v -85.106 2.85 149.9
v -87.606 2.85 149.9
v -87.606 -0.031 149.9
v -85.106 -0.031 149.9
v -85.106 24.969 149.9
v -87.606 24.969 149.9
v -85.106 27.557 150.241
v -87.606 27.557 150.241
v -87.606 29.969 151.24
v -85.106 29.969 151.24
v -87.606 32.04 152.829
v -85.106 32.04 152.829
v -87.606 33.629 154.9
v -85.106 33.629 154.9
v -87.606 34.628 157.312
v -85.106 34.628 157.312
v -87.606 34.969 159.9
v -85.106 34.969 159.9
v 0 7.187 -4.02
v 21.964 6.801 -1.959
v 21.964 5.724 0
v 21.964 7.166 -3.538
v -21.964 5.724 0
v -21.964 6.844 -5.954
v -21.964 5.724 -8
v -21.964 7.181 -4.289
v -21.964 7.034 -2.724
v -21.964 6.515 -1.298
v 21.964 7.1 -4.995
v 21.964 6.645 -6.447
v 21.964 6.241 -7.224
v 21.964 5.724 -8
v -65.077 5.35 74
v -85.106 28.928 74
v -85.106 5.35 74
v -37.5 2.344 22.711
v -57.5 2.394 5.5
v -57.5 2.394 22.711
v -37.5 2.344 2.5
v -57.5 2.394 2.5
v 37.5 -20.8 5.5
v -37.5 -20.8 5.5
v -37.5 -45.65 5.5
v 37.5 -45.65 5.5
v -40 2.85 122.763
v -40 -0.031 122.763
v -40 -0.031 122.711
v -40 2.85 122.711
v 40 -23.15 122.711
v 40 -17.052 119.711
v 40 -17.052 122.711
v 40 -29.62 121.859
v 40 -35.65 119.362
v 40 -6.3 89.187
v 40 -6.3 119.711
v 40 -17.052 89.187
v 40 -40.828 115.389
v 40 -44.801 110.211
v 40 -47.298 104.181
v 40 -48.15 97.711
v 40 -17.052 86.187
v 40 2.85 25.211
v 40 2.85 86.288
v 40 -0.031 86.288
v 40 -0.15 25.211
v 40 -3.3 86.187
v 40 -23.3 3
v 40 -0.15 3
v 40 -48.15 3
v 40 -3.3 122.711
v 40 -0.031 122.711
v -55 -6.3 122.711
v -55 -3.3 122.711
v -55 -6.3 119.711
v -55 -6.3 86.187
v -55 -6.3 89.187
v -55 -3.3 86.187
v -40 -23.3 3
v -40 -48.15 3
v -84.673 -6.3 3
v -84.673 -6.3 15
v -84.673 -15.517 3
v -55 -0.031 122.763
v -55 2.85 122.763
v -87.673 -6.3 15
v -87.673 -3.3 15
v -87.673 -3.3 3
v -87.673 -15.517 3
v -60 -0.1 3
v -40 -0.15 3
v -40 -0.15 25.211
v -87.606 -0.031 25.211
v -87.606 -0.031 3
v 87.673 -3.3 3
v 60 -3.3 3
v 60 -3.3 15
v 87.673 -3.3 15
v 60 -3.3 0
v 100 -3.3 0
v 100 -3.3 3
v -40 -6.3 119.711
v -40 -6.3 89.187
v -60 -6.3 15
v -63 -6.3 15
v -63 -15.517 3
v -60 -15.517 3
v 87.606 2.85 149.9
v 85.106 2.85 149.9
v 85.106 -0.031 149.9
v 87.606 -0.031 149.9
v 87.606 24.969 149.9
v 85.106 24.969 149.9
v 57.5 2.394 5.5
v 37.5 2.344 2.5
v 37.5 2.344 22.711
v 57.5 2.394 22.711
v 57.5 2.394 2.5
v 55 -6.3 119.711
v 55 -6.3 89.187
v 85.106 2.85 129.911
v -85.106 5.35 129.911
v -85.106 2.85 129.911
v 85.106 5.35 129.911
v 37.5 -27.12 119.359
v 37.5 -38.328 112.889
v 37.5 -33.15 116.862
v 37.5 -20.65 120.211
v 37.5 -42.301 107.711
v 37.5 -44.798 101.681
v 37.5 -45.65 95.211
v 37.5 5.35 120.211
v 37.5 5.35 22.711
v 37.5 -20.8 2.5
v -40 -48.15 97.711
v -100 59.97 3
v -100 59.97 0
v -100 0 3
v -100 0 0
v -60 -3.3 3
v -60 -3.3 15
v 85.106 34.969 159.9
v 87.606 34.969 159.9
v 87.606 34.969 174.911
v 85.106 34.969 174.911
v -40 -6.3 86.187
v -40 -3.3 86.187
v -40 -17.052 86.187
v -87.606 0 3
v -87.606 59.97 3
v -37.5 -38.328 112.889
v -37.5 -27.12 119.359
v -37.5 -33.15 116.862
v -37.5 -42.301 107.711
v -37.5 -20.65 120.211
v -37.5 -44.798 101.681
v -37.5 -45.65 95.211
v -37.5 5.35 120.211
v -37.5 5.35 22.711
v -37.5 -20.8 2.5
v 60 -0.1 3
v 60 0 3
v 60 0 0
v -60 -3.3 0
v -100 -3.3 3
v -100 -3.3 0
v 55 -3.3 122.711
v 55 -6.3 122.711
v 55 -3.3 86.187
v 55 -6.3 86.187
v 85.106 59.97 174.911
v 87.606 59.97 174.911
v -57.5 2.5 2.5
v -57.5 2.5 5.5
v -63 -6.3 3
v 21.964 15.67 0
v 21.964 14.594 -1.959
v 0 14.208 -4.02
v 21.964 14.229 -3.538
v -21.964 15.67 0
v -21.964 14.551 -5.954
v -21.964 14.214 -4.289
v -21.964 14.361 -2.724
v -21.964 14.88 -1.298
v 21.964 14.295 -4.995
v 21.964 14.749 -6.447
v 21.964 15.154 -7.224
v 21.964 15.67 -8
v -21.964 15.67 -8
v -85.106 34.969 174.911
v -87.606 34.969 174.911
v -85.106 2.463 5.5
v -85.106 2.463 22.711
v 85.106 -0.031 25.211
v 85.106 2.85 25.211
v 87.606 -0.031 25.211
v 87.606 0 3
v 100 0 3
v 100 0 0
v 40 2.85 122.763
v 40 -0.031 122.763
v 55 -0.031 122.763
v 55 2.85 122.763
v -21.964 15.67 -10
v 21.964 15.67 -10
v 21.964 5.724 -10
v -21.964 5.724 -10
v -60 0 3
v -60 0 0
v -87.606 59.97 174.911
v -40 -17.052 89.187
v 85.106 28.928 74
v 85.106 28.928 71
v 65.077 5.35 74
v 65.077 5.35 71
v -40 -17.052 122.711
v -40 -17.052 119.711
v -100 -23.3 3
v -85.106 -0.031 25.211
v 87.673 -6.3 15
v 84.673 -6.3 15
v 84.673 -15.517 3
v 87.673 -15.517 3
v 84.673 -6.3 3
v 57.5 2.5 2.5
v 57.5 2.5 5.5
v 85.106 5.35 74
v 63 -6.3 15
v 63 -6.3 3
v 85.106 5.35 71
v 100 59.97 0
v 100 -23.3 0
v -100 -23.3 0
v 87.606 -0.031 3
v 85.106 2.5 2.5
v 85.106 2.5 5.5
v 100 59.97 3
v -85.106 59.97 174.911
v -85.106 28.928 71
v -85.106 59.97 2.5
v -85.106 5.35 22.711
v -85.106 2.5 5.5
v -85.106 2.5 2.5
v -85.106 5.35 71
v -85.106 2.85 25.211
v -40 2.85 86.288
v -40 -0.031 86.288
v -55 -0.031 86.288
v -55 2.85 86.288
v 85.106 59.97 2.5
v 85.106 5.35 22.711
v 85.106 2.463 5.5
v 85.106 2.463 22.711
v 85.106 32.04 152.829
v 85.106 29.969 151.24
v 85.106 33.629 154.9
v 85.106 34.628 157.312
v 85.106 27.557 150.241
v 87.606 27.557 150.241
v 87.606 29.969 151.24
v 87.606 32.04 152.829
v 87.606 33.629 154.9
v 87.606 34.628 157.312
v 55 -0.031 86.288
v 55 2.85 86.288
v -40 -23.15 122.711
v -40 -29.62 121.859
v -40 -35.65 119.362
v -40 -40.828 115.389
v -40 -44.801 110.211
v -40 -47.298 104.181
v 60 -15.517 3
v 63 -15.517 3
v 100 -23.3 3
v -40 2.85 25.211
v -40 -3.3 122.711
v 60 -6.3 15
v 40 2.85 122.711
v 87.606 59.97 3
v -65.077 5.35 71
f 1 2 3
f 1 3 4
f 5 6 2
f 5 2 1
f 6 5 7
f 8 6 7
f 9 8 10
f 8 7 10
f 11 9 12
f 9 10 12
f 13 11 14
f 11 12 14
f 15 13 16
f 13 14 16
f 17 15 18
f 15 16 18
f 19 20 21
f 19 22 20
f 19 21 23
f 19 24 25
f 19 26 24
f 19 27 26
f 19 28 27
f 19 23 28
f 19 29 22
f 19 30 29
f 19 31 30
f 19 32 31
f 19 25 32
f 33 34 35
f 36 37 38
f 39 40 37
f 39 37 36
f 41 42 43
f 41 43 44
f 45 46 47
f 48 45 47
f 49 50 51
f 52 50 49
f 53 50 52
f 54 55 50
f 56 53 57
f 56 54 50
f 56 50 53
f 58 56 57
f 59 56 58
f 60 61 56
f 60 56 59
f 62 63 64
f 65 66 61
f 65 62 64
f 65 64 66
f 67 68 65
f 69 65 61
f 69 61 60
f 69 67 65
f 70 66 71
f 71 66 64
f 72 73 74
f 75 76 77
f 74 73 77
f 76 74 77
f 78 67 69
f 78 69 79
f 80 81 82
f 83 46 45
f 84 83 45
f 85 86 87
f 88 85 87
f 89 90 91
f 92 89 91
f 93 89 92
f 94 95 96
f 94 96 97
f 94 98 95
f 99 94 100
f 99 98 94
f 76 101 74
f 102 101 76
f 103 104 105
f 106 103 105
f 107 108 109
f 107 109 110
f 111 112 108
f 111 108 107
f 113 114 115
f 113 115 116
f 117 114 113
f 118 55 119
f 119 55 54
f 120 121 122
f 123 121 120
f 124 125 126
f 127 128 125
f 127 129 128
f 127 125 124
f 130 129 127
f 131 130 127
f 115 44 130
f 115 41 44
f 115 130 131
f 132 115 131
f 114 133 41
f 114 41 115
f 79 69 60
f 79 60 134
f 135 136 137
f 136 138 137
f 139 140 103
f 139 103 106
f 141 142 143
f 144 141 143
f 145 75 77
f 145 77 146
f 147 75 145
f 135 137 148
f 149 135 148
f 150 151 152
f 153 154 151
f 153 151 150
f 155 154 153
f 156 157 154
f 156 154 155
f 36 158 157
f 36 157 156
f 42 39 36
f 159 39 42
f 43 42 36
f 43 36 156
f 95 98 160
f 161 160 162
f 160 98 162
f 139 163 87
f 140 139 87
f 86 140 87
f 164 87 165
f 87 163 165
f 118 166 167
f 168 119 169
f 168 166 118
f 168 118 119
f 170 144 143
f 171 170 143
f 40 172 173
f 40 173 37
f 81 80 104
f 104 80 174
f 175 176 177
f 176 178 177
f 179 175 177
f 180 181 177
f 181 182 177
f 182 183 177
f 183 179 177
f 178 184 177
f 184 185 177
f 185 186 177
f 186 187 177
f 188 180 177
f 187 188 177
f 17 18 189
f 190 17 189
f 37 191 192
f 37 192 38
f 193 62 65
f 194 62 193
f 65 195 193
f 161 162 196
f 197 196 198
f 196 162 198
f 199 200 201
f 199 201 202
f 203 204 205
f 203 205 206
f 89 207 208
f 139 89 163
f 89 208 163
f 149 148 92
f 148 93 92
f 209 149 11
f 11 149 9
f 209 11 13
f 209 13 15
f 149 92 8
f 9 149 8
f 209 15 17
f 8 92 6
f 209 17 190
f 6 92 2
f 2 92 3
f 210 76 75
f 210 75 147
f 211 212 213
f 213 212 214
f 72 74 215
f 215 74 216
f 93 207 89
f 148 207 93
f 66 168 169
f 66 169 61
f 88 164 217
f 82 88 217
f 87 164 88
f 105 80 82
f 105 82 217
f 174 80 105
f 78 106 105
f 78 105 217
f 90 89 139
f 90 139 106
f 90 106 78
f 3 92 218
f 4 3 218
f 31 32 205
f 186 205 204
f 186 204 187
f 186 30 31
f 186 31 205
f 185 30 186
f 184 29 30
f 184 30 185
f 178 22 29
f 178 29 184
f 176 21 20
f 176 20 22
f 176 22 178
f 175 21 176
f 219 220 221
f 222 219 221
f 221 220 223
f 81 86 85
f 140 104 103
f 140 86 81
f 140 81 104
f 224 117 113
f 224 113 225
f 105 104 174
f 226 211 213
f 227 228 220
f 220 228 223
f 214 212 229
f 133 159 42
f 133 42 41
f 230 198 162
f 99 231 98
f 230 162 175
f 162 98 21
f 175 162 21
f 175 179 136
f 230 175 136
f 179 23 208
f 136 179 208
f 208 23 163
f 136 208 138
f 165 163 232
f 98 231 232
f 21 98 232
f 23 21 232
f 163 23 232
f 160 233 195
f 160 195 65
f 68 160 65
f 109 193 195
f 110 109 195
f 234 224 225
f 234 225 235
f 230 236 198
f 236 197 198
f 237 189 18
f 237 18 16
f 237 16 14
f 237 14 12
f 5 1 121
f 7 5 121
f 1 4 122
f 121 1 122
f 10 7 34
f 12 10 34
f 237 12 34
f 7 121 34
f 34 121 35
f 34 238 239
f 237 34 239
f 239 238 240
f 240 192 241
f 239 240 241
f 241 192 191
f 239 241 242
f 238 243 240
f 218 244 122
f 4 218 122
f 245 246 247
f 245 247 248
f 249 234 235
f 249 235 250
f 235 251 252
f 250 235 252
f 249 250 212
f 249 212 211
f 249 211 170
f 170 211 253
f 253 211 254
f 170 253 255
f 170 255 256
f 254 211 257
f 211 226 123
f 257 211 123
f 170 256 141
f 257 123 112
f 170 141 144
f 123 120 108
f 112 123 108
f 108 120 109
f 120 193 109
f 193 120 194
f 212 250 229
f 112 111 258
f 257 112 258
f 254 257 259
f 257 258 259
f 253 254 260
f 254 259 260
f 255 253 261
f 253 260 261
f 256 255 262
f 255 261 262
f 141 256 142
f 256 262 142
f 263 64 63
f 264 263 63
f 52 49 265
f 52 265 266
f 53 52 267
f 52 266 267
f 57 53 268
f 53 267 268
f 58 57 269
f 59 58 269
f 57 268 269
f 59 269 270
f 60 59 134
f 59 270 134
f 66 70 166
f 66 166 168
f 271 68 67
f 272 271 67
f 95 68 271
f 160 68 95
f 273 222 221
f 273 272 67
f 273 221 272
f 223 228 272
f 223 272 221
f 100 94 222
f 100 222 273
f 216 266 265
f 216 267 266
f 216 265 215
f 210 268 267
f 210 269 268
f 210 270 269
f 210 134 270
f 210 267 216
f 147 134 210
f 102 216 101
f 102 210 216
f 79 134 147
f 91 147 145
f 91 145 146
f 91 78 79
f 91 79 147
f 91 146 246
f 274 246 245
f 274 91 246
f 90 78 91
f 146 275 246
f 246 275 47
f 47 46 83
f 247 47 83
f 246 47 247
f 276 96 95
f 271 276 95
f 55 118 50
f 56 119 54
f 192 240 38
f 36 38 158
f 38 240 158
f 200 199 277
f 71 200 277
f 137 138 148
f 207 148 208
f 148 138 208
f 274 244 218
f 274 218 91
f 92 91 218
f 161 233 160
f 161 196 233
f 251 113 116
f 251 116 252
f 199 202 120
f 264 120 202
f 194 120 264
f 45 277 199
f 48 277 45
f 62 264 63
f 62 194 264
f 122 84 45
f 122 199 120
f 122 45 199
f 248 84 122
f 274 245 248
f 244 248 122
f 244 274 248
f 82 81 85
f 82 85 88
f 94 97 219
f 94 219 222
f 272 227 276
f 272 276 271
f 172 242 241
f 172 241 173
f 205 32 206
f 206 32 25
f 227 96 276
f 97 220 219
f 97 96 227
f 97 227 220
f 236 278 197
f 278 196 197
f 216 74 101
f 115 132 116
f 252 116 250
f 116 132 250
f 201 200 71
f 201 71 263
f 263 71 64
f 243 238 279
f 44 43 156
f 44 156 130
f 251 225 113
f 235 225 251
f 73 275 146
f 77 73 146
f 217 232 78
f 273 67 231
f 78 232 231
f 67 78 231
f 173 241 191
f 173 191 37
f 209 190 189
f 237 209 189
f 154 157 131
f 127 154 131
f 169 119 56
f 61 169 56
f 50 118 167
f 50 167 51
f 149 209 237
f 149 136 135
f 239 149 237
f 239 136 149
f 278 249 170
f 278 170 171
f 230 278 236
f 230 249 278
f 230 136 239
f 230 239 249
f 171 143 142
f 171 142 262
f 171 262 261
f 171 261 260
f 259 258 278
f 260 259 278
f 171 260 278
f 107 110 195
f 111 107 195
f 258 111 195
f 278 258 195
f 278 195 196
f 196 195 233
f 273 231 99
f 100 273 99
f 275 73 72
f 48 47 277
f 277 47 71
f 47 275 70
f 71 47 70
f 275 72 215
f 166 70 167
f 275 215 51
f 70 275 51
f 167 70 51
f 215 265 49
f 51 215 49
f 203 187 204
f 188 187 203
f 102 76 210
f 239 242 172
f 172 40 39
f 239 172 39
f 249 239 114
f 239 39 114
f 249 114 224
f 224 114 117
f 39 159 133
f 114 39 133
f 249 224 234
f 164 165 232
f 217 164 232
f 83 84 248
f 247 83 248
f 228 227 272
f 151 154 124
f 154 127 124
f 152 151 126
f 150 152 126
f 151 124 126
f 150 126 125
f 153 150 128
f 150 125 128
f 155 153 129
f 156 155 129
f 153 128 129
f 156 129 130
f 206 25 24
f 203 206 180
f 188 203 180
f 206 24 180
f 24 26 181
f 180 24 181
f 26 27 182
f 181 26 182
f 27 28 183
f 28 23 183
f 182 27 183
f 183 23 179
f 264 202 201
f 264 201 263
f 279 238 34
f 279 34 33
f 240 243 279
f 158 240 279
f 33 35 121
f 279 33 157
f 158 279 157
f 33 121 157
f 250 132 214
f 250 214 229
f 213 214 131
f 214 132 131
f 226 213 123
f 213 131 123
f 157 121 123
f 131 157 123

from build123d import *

# Parameters (mm, degrees)
EXTRUDE_1_DEPTH          = 3
EXTRUDE_2_DEPTH          = 121.210911
SKETCH_3_W               = 47.605950515
SKETCH_3_H               = 3
CUT_EXTRUDE_1_DEPTH      = 99
SKETCH_5_W               = 185.441878516
SKETCH_5_H               = 108.742952173
CUT_EXTRUDE_2_DEPTH      = 1.5
SKETCH_6_W               = 175.21190103
SKETCH_6_H               = 36.65
EXTRUDE_3_DEPTH          = 7.2
SHELL_START              = 5.5
SHELL_1_DEPTH            = 114.710911355
SHELL_START_2            = 2.5
SHELL_1_2_OUTLINE_W      = 170.21190103
SHELL_1_2_OUTLINE_H      = 34.15
SHELL_1_2_DEPTH          = 124.910911355
SHELL_1_3_DEPTH          = 20.210911355
SHELL_1_4_DEPTH          = 17.210911355
SKETCH_7_W               = 170.21190103
SKETCH_7_H               = 34.15
CUT_EXTRUDE_3_DEPTH      = 7.2
SKETCH_8_W               = 2.5
SKETCH_8_H               = 36.65
EXTRUDE_4_DEPTH          = 45
CUT_EXTRUDE_4_DEPTH      = 261.975558395
SKETCH_10_W              = 2.5
SKETCH_10_H              = 2.880985124
EXTRUDE_5_DEPTH          = 124.689092
SKETCH_11_W              = 36.523943303
SKETCH_11_H              = 3
EXTRUDE_6_DEPTH          = 15
SKETCH_12_W              = 36.475357481
SKETCH_12_H              = 3.054288943
EXTRUDE_7_DEPTH          = 15
FILLET_1_R               = 25
SKETCH_13_W              = 43.927566906
SKETCH_13_H              = 9.945864205
EXTRUDE_8_DEPTH          = 8
CUT_EXTRUDE_5_DEPTH      = 219.603325421
SKETCH_15_W              = 43.927566906
SKETCH_15_H              = 9.945864205
EXTRUDE_9_DEPTH          = 2
SKETCH_17_W              = 27.673413216
SKETCH_17_H              = 3
EXTRUDE_10_DEPTH         = 12
RIB_1_REACH              = 263.024
SKETCH_18_WALL_W         = 539.179228978
SKETCH_18_WALL_H         = 3
MIRROR_5_COPY_1_REACH    = 263.024
MIRROR_5_COPY_1_SKETCH_W = 539.179228978
MIRROR_5_COPY_1_SKETCH_H = 3
RIB_2_REACH              = 175.005
SKETCH_19_WALL_W         = 366.464948776
SKETCH_19_WALL_H         = 3
MIRROR_7_COPY_1_REACH    = 175.005
MIRROR_7_COPY_1_SKETCH_W = 366.464948776
MIRROR_7_COPY_1_SKETCH_H = 3
RIB_3_REACH              = 153.018
SKETCH_20_WALL_W         = 334.972416452
SKETCH_20_WALL_H         = 3
EXTRUDE_11_DEPTH         = 20.47
CUT_EXTRUDE_6_DEPTH      = 264.412642976


# Read off the part's stored shape, not the designer's step: 抽壳1
with BuildPart() as part:
    # 草图1 → 凸台-拉伸1 (new body)
    with BuildSketch(Plane.XY):
        Polygon((-100, 0), (-60, 0), (-60, -3.3), (-100, -3.3), (-100, -23.3), (100, -23.3), (100, -3.3), (60, -3.3), (60, 0), (100, 0), (100, 39.5), (-100, 39.5), align=None)
    extrude(amount=EXTRUDE_1_DEPTH)

    # 草图2 → 凸台-拉伸2 (add)
    with BuildSketch(Plane.XY.offset(3)):
        Polygon((40, -48.15), (-40, -48.15), (-40, -0.15), (-87.605950515, -0.030985124), (-87.605950515, 39.5), (87.605950515, 39.5), (87.605950515, -0.030985124), (40, -0.15), align=None)
    extrude(amount=EXTRUDE_2_DEPTH)

    # 草图3 → 切除-拉伸1 (cut)
    with BuildSketch(Plane.XY.offset(124.210911355)):
        with Locations((63.802975258, 1.35)):
            Rectangle(SKETCH_3_W, SKETCH_3_H)
        with Locations((-63.802975258, 1.35)):
            Rectangle(SKETCH_3_W, SKETCH_3_H)
    extrude(amount=-CUT_EXTRUDE_1_DEPTH, mode=Mode.SUBTRACT)

    # 草图5 → 切除-拉伸2 (cut)
    with BuildSketch(Plane.XY.offset(124.210911355)):
        with Locations((-1.343781728, 1.77370169)):
            Rectangle(SKETCH_5_W, SKETCH_5_H)
    extrude(amount=-CUT_EXTRUDE_2_DEPTH, mode=Mode.SUBTRACT)

    # 草图6 → 凸台-拉伸3 (add)
    with BuildSketch(Plane.XY.offset(122.710911355)):
        with Locations((0, 21.175)):
            Rectangle(SKETCH_6_W, SKETCH_6_H)
    extrude(amount=EXTRUDE_3_DEPTH)

    # 抽壳1 outline → 抽壳1 (cut)
    with BuildSketch(Plane.XY.offset(SHELL_START)):
        Polygon((-85.105950515, 39.5), (-85.105950515, 5.35), (-37.5, 5.35), (-37.5, -45.65), (37.5, -45.65), (37.5, 5.35), (85.105950515, 5.35), (85.105950515, 39.5), align=None)
    extrude(amount=SHELL_1_DEPTH, mode=Mode.SUBTRACT)

    # Shell 1 2 outline → Shell 1 2 (cut)
    with BuildSketch(Plane.XY.offset(SHELL_START_2)):
        with Locations((0, 22.425)):
            Rectangle(SHELL_1_2_OUTLINE_W, SHELL_1_2_OUTLINE_H)
    extrude(amount=SHELL_1_2_DEPTH, mode=Mode.SUBTRACT)

    # Shell 1 3 outline → Shell 1 3 (cut)
    with BuildSketch(Plane.XY.offset(SHELL_START_2)):
        Polygon((-85.105950515, 5.35), (-85.105950515, 2.5), (-57.5, 2.5), (-57.5, 2.393757812), (-37.5, 2.343757812), (-37.5, -20.8), (37.5, -20.8), (37.5, 2.343757812), (57.5, 2.393757812), (57.5, 2.5), (85.105950515, 2.5), (85.105950515, 5.35), align=None)
    extrude(amount=SHELL_1_3_DEPTH, mode=Mode.SUBTRACT)

    # Shell 1 4 outline → Shell 1 4 (cut)
    with BuildSketch(Plane.XY.offset(SHELL_START)):
        Polygon((-85.105950515, 2.5), (-85.105950515, 2.462772689), (-57.5, 2.393757812), (-57.5, 2.5), align=None)
        Polygon((85.105950515, 2.462772689), (85.105950515, 2.5), (57.5, 2.5), (57.5, 2.393757812), align=None)
    extrude(amount=SHELL_1_4_DEPTH, mode=Mode.SUBTRACT)

    # 草图7 → 切除-拉伸3 (cut)
    with BuildSketch(Plane.XY.offset(129.910911355)):
        with Locations((0, 22.425)):
            Rectangle(SKETCH_7_W, SKETCH_7_H)
    extrude(amount=-CUT_EXTRUDE_3_DEPTH, mode=Mode.SUBTRACT)

    # 草图8 → 凸台-拉伸4 (add)
    with BuildSketch(Plane.XY.offset(129.910911355)):
        with Locations((86.355950515, 21.175)):
            Rectangle(SKETCH_8_W, SKETCH_8_H)
    extrude_4 = extrude(amount=EXTRUDE_4_DEPTH)

    # 镜向1: 凸台-拉伸4 across plane
    add(extrude_4.mirror(Plane(origin=(0, 0, 0), x_dir=(0, 0, 1), z_dir=(1, 0, 0))))

    # 草图9 → 切除-拉伸4 (cut, through all)
    with BuildSketch(Plane(origin=(87.605950515, 0, 0), x_dir=(0, 0, -1), z_dir=(1, 0, 0))):
        with BuildLine():
            ThreePointArc((-153.435169701, 14.152379613), (-157.269646082, 19.530454036), (-163.545332043, 21.590225708))
            Line((-163.545332043, 21.590225708), (-164.318099098, 21.561993734))
            Line((-164.318099098, 21.561993734), (-174.910911355, 21.175))
            Line((-174.910911355, 21.175), (-174.910911355, 2.85))
            Line((-174.910911355, 2.85), (-149.900003415, 2.85))
            Line((-149.900003415, 2.85), (-153.435169701, 14.152379613))
        make_face()
    extrude(amount=-CUT_EXTRUDE_4_DEPTH, mode=Mode.SUBTRACT)

    # 草图10 → 凸台-拉伸5 (add)
    with BuildSketch(Plane.XY.offset(25.210911355)):
        with Locations((86.355950515, 1.409507438)):
            Rectangle(SKETCH_10_W, SKETCH_10_H)
        with Locations((-86.355950515, 1.409507438)):
            Rectangle(SKETCH_10_W, SKETCH_10_H)
    extrude(amount=EXTRUDE_5_DEPTH)

    # 草图11 → 凸台-拉伸6 (add)
    with BuildSketch(Plane(origin=(40, 0, 0), x_dir=(0, 0, -1), z_dir=(1, 0, 0))):
        with Locations((-104.448939704, -4.8)):
            Rectangle(SKETCH_11_W, SKETCH_11_H)
    extrude_6 = extrude(amount=EXTRUDE_6_DEPTH)

    # 镜向2: 凸台-拉伸6 across plane
    add(extrude_6.mirror(Plane(origin=(0, 0, 0), x_dir=(0, 0, 1), z_dir=(1, 0, 0))))

    # 草图12 → 凸台-拉伸7 (add)
    with BuildSketch(Plane(origin=(40, 0, 0), x_dir=(0, 0, -1), z_dir=(1, 0, 0))):
        with Locations((-104.525351124, 1.496159348)):
            Rectangle(SKETCH_12_W, SKETCH_12_H)
    extrude_7 = extrude(amount=EXTRUDE_7_DEPTH)

    # 镜向3: 凸台-拉伸7 across plane
    add(extrude_7.mirror(Plane(origin=(0, 0, 0), x_dir=(0, 0, 1), z_dir=(1, 0, 0))))

    # 圆角1
    fillet_1_edges = [part.edges().sort_by_distance(p)[0] for p in [
        (0, -48.15, 122.710911355),
        (0, -45.65, 120.210911355),
    ]]
    fillet(fillet_1_edges, radius=FILLET_1_R)

    # 草图13 → 凸台-拉伸8 (add)
    with BuildSketch(Plane(origin=(0, 0, 0), x_dir=(-1, 0, 0), z_dir=(0, 0, -1))):
        with Locations((0, 10.69739906)):
            Rectangle(SKETCH_13_W, SKETCH_13_H)
    extrude(amount=EXTRUDE_8_DEPTH)

    # 草图14 → 切除-拉伸5 (cut, through all)
    with BuildSketch(Plane(origin=(21.963783453, 0, 0), x_dir=(0, 0, -1), z_dir=(1, 0, 0))):
        with BuildLine():
            add(Edge.make_bspline(
                [(0, 15.670331162), (4.03969355, 12.74473692), (8, 15.670331162)],
                knots=[0, 0, 0, 1, 1, 1], degree=2))
            Line((8, 15.670331162), (0, 15.670331162))
        make_face()
        with BuildLine():
            add(Edge.make_bspline(
                [(0, 5.724466957), (4.03969355, 8.650061199), (8, 5.724466957)],
                knots=[0, 0, 0, 1, 1, 1], degree=2))
            Line((8, 5.724466957), (0, 5.724466957))
        make_face()
    extrude(amount=-CUT_EXTRUDE_5_DEPTH, mode=Mode.SUBTRACT)

    # 草图15 → 凸台-拉伸9 (add)
    with BuildSketch(Plane(origin=(0, 0, -8), x_dir=(-1, 0, 0), z_dir=(0, 0, -1))):
        with Locations((0, 10.69739906)):
            Rectangle(SKETCH_15_W, SKETCH_15_H)
    extrude(amount=EXTRUDE_9_DEPTH)

    # 草图17 → 凸台-拉伸10 (add)
    with BuildSketch(Plane.XY.offset(3)):
        with Locations((73.836706608, -4.8)):
            Rectangle(SKETCH_17_W, SKETCH_17_H)
        with Locations((-73.836706608, -4.8)):
            Rectangle(SKETCH_17_W, SKETCH_17_H)
    extrude(amount=EXTRUDE_10_DEPTH)

    # 草图18 wall → 筋1 (add, up to next)
    with BuildSketch(Plane(origin=(87.673413216, -10.908430107, 9), x_dir=(0, -0.60913308834, -0.793068017694), z_dir=(0, 0.793068017694, -0.60913308834)), mode=Mode.PRIVATE) as rib_1_sk1:
        with Locations((0, 1.5)):
            Rectangle(SKETCH_18_WALL_W, SKETCH_18_WALL_H)
    rib_1_tool1 = extrude(rib_1_sk1.sketch, amount=RIB_1_REACH, mode=Mode.PRIVATE) - part.part
    rib_1 = rib_1_tool1.solids().sort_by_distance((87.673413216, -10.908430107, 9))[0]
    add(rib_1)

    # 镜向4: 筋1 across plane
    add(rib_1.mirror(Plane(origin=(73.836706608, 0, 0), x_dir=(0, 0, 1), z_dir=(1, 0, 0))))

    # 镜向5: 筋1 across plane
    add(rib_1.mirror(Plane(origin=(0, 0, 0), x_dir=(0, 0, 1), z_dir=(1, 0, 0))))

    # 镜向5 copy 1 sketch → 镜向5 copy 1 (add, up to next)
    with BuildSketch(Plane(origin=(-60, -10.908430107, 9), x_dir=(0, -0.60913308834, -0.793068017694), z_dir=(0, 0.793068017694, -0.60913308834)), mode=Mode.PRIVATE) as mirror_5_copy_1_sk1:
        with Locations((0, 1.5)):
            Rectangle(MIRROR_5_COPY_1_SKETCH_W, MIRROR_5_COPY_1_SKETCH_H)
    mirror_5_copy_1_tool1 = extrude(mirror_5_copy_1_sk1.sketch, amount=MIRROR_5_COPY_1_REACH, mode=Mode.PRIVATE) - part.part
    add(mirror_5_copy_1_tool1.solids().sort_by_distance((-60, -10.908430107, 9))[0])

    # 草图19 wall → 筋2 (add, up to next)
    with BuildSketch(Plane(origin=(47.5, -11.676129128, 122.710911355), x_dir=(-0.812759187769, -0.582599779176, 0), z_dir=(0.582599779176, -0.812759187769, 0)), mode=Mode.PRIVATE) as rib_2_sk1:
        with Locations((0, 1.5)):
            Rectangle(SKETCH_19_WALL_W, SKETCH_19_WALL_H)
    rib_2_tool1 = extrude(rib_2_sk1.sketch, amount=-RIB_2_REACH, mode=Mode.PRIVATE) - part.part
    rib_2 = rib_2_tool1.solids().sort_by_distance((47.5, -11.676129128, 122.710911355))[0]
    add(rib_2)

    # 镜向6: 筋2 across plane
    add(rib_2.mirror(Plane.XY.offset(104.448939704)))

    # 镜向7: 筋2 across plane
    add(rib_2.mirror(Plane(origin=(0, 0, 0), x_dir=(0, 0, 1), z_dir=(1, 0, 0))))

    # 镜向7 copy 1 sketch → 镜向7 copy 1 (add, up to next)
    with BuildSketch(Plane(origin=(-47.5, -11.676129128, 86.186968052), x_dir=(0.812759187769, -0.582599779176, 0), z_dir=(-0.582599779176, -0.812759187769, 0)), mode=Mode.PRIVATE) as mirror_7_copy_1_sk1:
        with Locations((0, 1.5)):
            Rectangle(MIRROR_7_COPY_1_SKETCH_W, MIRROR_7_COPY_1_SKETCH_H)
    mirror_7_copy_1_tool1 = extrude(mirror_7_copy_1_sk1.sketch, amount=-MIRROR_7_COPY_1_REACH, mode=Mode.PRIVATE) - part.part
    add(mirror_7_copy_1_tool1.solids().sort_by_distance((-47.5, -11.676129128, 86.186968052))[0])

    # 草图20 wall → 筋3 (add, up to next)
    with BuildSketch(Plane(origin=(75.091649782, 17.139028744, 72.5), x_dir=(-0.647409171989, -0.762142613967, 0), z_dir=(0.762142613967, -0.647409171989, 0)), mode=Mode.PRIVATE) as rib_3_sk1:
        Rectangle(SKETCH_20_WALL_W, SKETCH_20_WALL_H)
    rib_3_tool1 = extrude(rib_3_sk1.sketch, amount=RIB_3_REACH, mode=Mode.PRIVATE) - part.part
    rib_3 = rib_3_tool1.solids().sort_by_distance((75.091649782, 17.139028744, 72.5))[0]
    add(rib_3)

    # 镜向8: 筋3 across plane
    add(rib_3.mirror(Plane(origin=(0, 0, 0), x_dir=(0, 0, 1), z_dir=(1, 0, 0))))

    # 草图21 → 凸台-拉伸11 (add)
    with BuildSketch(Plane(origin=(0, 39.5, 0), x_dir=(1, 0, 0), z_dir=(0, 1, 0))):
        Polygon((-87.605950515, -174.910911355), (-85.105950515, -174.910911355), (-85.105950515, -2.5), (85.105950515, -2.5), (85.105950515, -174.910911355), (87.605950515, -174.910911355), (87.605950515, -3), (100, -3), (100, 0), (87.605950515, 0), (85.105950515, 0), (-85.105950515, 0), (-87.605950515, 0), (-100, 0), (-100, -3), (-87.605950515, -3), align=None)
    extrude(amount=EXTRUDE_11_DEPTH)

    # 草图22 → 切除-拉伸6 (cut, through all)
    with BuildSketch(Plane(origin=(87.605950515, 0, 0), x_dir=(0, 0, -1), z_dir=(1, 0, 0))):
        with BuildLine():
            Line((-149.900003415, -0.030985124), (-149.900003415, 24.969014876))
            ThreePointArc((-149.900003415, 24.969014876), (-152.828935603, 32.040082688), (-159.900003415, 34.969014876))
            Line((-159.900003415, 34.969014876), (-174.910911355, 34.969014876))
            Line((-174.910911355, 34.969014876), (-174.910911355, -0.030985124))
            Line((-174.910911355, -0.030985124), (-149.900003415, -0.030985124))
        make_face()
    extrude(amount=-CUT_EXTRUDE_6_DEPTH, mode=Mode.SUBTRACT)


solid = part.part
